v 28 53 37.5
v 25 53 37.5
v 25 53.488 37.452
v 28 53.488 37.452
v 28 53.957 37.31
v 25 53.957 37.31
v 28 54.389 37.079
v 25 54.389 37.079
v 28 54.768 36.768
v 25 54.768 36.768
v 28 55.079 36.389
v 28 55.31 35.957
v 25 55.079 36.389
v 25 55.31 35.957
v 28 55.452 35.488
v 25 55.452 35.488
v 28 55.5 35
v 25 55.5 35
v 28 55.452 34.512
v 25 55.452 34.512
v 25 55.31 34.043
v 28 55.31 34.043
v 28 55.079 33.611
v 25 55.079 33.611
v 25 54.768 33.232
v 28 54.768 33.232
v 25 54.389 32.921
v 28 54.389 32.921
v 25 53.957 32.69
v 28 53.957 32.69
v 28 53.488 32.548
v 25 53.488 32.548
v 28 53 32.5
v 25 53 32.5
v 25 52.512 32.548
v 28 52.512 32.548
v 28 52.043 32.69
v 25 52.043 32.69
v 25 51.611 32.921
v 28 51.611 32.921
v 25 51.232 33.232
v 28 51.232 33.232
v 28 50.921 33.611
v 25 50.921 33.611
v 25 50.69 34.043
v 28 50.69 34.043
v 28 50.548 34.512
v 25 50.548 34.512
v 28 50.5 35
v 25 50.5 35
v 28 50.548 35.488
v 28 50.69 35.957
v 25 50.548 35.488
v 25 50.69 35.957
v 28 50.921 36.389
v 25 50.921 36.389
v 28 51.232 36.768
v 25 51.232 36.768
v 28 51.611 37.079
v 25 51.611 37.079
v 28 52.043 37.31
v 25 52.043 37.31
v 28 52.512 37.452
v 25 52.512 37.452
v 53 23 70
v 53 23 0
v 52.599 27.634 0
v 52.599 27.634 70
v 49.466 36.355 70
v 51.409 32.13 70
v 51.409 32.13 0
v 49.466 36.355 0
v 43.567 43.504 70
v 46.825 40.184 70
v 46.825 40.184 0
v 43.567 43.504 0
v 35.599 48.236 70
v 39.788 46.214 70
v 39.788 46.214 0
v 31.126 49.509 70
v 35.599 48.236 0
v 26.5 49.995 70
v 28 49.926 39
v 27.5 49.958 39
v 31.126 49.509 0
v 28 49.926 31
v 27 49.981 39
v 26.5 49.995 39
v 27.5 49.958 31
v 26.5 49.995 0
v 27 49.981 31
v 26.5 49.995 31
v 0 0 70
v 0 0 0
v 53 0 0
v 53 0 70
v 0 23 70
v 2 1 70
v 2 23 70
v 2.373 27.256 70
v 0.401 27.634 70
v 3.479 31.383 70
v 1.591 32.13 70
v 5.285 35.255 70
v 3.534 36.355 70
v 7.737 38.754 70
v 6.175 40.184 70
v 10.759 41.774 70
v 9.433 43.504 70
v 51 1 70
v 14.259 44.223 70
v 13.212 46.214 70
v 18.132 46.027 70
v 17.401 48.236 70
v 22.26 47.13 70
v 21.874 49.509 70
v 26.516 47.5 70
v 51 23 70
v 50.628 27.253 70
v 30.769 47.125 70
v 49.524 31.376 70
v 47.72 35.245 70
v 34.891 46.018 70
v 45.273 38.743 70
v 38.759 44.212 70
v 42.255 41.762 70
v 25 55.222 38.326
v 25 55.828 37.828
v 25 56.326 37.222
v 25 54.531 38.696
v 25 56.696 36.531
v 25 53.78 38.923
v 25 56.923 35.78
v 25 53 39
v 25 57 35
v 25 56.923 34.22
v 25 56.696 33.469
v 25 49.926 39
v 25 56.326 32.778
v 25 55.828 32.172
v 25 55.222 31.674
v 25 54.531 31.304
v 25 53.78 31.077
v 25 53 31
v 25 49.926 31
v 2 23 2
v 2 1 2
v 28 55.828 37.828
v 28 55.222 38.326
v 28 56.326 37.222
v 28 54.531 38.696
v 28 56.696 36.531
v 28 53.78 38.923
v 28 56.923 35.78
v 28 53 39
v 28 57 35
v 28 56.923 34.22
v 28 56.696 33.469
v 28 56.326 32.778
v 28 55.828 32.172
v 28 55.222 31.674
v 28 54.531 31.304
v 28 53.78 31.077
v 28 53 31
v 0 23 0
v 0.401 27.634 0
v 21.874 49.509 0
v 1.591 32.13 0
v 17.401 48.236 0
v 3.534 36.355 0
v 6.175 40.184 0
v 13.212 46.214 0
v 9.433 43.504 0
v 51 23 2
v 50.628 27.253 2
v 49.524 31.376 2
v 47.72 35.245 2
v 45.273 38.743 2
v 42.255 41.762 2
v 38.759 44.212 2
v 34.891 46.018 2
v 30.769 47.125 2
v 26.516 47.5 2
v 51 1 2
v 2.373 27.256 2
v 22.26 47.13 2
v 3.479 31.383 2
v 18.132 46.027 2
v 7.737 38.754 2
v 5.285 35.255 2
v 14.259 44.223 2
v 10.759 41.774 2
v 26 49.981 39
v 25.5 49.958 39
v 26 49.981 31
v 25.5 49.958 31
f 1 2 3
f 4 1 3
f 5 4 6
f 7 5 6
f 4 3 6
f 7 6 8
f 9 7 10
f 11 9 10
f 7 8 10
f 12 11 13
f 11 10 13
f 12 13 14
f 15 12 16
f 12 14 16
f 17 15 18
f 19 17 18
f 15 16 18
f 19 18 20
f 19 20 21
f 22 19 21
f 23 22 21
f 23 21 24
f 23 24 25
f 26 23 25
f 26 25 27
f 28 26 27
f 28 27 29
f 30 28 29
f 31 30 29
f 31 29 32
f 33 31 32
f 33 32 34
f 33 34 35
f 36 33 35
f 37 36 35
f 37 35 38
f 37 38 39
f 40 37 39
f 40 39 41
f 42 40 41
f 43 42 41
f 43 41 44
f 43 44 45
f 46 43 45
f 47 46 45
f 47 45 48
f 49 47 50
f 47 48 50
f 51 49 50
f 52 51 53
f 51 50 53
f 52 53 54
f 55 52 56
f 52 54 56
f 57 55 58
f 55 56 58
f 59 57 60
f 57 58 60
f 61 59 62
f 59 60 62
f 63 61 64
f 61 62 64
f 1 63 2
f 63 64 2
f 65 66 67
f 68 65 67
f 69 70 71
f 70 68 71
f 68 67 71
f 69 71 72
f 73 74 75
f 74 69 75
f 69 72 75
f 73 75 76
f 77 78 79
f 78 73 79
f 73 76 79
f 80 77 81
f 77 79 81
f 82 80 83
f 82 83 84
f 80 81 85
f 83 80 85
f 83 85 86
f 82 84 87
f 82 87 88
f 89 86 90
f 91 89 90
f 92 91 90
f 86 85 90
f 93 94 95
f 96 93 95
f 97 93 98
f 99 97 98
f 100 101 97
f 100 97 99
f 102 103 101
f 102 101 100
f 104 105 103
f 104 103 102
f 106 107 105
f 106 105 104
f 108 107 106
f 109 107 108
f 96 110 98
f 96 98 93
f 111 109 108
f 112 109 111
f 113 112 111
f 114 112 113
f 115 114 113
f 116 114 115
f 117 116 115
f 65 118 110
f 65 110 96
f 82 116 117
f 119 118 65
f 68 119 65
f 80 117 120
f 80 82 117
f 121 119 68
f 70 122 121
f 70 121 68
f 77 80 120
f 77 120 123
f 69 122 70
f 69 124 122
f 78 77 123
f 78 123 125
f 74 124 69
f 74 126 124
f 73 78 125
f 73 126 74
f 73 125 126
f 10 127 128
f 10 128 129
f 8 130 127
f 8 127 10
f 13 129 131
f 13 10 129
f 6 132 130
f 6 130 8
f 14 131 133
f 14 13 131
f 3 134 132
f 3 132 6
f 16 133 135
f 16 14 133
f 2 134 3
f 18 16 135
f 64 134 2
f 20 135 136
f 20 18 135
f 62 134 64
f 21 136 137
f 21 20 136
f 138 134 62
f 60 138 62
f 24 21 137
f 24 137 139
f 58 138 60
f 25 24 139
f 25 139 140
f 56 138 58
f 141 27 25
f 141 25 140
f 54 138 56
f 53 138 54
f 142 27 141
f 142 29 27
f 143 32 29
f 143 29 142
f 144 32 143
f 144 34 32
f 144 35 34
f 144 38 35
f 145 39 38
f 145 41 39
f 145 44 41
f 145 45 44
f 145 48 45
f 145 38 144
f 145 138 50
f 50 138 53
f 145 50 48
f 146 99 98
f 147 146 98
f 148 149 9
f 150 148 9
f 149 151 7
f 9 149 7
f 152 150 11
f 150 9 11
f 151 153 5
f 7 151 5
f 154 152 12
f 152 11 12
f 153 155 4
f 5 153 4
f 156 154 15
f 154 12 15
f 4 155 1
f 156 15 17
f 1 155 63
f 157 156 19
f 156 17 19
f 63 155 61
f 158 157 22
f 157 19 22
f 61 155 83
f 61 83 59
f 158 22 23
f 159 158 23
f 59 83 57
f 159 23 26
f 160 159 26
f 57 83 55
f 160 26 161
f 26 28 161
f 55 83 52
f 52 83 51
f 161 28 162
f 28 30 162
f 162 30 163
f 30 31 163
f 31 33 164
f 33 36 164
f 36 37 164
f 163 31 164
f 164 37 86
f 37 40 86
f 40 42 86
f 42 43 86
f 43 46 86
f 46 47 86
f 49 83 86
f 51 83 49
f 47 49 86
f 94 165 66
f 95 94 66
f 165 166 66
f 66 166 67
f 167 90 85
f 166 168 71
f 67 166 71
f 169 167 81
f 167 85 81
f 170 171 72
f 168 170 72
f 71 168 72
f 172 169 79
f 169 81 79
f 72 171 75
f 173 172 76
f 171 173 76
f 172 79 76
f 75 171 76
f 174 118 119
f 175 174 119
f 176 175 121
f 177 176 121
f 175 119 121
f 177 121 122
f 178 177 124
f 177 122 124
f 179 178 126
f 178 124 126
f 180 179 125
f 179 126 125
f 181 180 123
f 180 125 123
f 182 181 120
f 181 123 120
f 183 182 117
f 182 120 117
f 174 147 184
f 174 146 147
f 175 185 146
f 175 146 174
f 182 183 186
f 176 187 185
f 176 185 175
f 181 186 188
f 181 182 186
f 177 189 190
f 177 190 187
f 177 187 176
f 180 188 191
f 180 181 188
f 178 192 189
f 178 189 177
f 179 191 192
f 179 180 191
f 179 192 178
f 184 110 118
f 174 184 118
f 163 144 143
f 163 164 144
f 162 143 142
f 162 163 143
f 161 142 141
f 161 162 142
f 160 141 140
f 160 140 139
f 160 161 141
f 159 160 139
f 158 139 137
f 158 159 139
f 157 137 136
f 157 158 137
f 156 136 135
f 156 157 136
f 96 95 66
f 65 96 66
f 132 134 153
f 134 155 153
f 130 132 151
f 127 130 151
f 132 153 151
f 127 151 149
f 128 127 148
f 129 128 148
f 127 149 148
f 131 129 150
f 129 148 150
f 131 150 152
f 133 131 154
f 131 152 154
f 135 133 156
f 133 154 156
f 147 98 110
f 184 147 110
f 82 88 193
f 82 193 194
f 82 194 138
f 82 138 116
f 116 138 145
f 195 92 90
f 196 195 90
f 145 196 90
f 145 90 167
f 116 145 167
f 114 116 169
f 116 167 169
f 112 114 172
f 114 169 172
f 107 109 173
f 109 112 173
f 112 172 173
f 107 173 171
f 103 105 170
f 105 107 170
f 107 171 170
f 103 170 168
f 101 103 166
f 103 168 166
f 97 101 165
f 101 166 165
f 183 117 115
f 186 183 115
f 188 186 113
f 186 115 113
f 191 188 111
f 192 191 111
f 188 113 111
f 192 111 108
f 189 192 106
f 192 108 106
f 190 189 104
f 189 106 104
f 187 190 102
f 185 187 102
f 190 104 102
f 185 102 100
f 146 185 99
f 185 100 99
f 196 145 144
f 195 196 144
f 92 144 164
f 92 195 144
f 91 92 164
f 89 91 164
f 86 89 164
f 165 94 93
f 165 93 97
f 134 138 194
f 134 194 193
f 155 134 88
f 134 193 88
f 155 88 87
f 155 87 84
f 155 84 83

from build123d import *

# Parameters (mm, degrees)
ESQUISSE1_W             = 53
ESQUISSE1_H             = 50
BOSS_EXTRU_1_DEPTH      = 70
ESQUISSE5_W             = 3
ESQUISSE5_H             = 8
BOSS_EXTRU_2_DEPTH      = 7
CONG_1_R                = 4
CONG_2_R                = 27
ESQUISSE8_R             = 2.5
ENL_V_MAT_EXTRU_3_DEPTH = 7
ENL_V_MAT_EXTRU_4_DEPTH = 68


# Some blends are built 0.0001 mm under size
with BuildPart() as part:
    # Esquisse1 → Boss.-Extru.1 (new body)
    with BuildSketch(Plane.XY):
        with Locations((26.5, 25)):
            Rectangle(ESQUISSE1_W, ESQUISSE1_H)
    extrude(amount=BOSS_EXTRU_1_DEPTH)

    # Esquisse5 → Boss.-Extru.2 (add)
    with BuildSketch(Plane(origin=(0, 50, 0), x_dir=(1, 0, 0), z_dir=(0, 1, 0))):
        with Locations((26.5, -35)):
            Rectangle(ESQUISSE5_W, ESQUISSE5_H)
    extrude(amount=BOSS_EXTRU_2_DEPTH)

    # Congé1
    cong_1_edges = [part.edges().sort_by_distance(p)[0] for p in [
        (26.5, 57, 31),
        (26.5, 57, 39),
    ]]
    fillet(cong_1_edges, radius=CONG_1_R - 0.0001)  # a hair under: the kernel refuses the full size

    # Congé2
    # the kernel refuses this fillet: 27 mm, written as the material it takes off along each edge
    with BuildSketch(Plane(origin=(0, 50, -67.5), x_dir=(1, 0, 0), z_dir=(0, 0, 1))) as cong_2_piece_1_section:
        with BuildLine():
            CenterArc((CONG_2_R, -CONG_2_R), CONG_2_R, 90, 90)
            Line((0, -CONG_2_R), (0, 0))
            Line((0, 0), (CONG_2_R, 0))
        make_face()
    cong_2_piece_1 = extrude(amount=205, mode=Mode.PRIVATE)
    cong_2_piece_1 = split(cong_2_piece_1, bisect_by=Plane(origin=(25, 50.257211281, -18.25), z_dir=(1, 0, 0)), keep=Keep.TOP, mode=Mode.PRIVATE)
    cong_2_piece_1 = split(cong_2_piece_1, bisect_by=Plane(origin=(25.978114042, 50.257211281, 31), z_dir=(0, 0, -1)), keep=Keep.TOP, mode=Mode.PRIVATE)
    add(cong_2_piece_1, mode=Mode.SUBTRACT)
    with BuildSketch(Plane(origin=(0, 50, -67.5), x_dir=(1, 0, 0), z_dir=(0, 0, 1))) as cong_2_piece_2_section:
        with BuildLine():
            CenterArc((CONG_2_R, -CONG_2_R), CONG_2_R, 90, 90)
            Line((0, -CONG_2_R), (0, 0))
            Line((0, 0), (CONG_2_R, 0))
        make_face()
    cong_2_piece_2 = extrude(amount=205, mode=Mode.PRIVATE)
    cong_2_piece_2 = split(cong_2_piece_2, bisect_by=Plane(origin=(25, 43.848394797, -18.25), z_dir=(-1, 0, 0)), keep=Keep.TOP, mode=Mode.PRIVATE)
    cong_2_piece_2 = split(cong_2_piece_2, bisect_by=Plane(origin=(5.991236712, 43.848394797, 31), z_dir=(0, 0, -1)), keep=Keep.TOP, mode=Mode.PRIVATE)
    add(cong_2_piece_2, mode=Mode.SUBTRACT)
    with BuildSketch(Plane(origin=(0, 50, -67.5), x_dir=(1, 0, 0), z_dir=(0, 0, 1))) as cong_2_piece_3_section:
        with BuildLine():
            CenterArc((CONG_2_R, -CONG_2_R), CONG_2_R, 90, 90)
            Line((0, -CONG_2_R), (0, 0))
            Line((0, 0), (CONG_2_R, 0))
        make_face()
    cong_2_piece_3 = extrude(amount=205, mode=Mode.PRIVATE)
    cong_2_piece_3 = split(cong_2_piece_3, bisect_by=Plane(origin=(25, 43.848394797, 35), z_dir=(-1, 0, 0)), keep=Keep.TOP, mode=Mode.PRIVATE)
    cong_2_piece_3 = split(cong_2_piece_3, bisect_by=Plane(origin=(5.991236712, 43.848394797, 31), z_dir=(0, 0, 1)), keep=Keep.TOP, mode=Mode.PRIVATE)
    cong_2_piece_3 = split(cong_2_piece_3, bisect_by=Plane(origin=(5.991236712, 43.848394797, 39), z_dir=(0, 0, -1)), keep=Keep.TOP, mode=Mode.PRIVATE)
    add(cong_2_piece_3, mode=Mode.SUBTRACT)
    with BuildSketch(Plane(origin=(0, 50, -67.5), x_dir=(1, 0, 0), z_dir=(0, 0, 1))) as cong_2_piece_4_section:
        with BuildLine():
            CenterArc((CONG_2_R, -CONG_2_R), CONG_2_R, 90, 90)
            Line((0, -CONG_2_R), (0, 0))
            Line((0, 0), (CONG_2_R, 0))
        make_face()
    cong_2_piece_4 = extrude(amount=205, mode=Mode.PRIVATE)
    cong_2_piece_4 = split(cong_2_piece_4, bisect_by=Plane(origin=(25, 50.257211281, 88.25), z_dir=(1, 0, 0)), keep=Keep.TOP, mode=Mode.PRIVATE)
    cong_2_piece_4 = split(cong_2_piece_4, bisect_by=Plane(origin=(25.978114042, 50.257211281, 39), z_dir=(0, 0, 1)), keep=Keep.TOP, mode=Mode.PRIVATE)
    add(cong_2_piece_4, mode=Mode.SUBTRACT)
    with BuildSketch(Plane(origin=(0, 50, -67.5), x_dir=(1, 0, 0), z_dir=(0, 0, 1))) as cong_2_piece_5_section:
        with BuildLine():
            CenterArc((CONG_2_R, -CONG_2_R), CONG_2_R, 90, 90)
            Line((0, -CONG_2_R), (0, 0))
            Line((0, 0), (CONG_2_R, 0))
        make_face()
    cong_2_piece_5 = extrude(amount=205, mode=Mode.PRIVATE)
    cong_2_piece_5 = split(cong_2_piece_5, bisect_by=Plane(origin=(25, 43.848394797, 88.25), z_dir=(-1, 0, 0)), keep=Keep.TOP, mode=Mode.PRIVATE)
    cong_2_piece_5 = split(cong_2_piece_5, bisect_by=Plane(origin=(5.991236712, 43.848394797, 39), z_dir=(0, 0, 1)), keep=Keep.TOP, mode=Mode.PRIVATE)
    add(cong_2_piece_5, mode=Mode.SUBTRACT)
    with BuildSketch(Plane(origin=(53, 50, -67.5), x_dir=(-1, 0, 0), z_dir=(0, 0, 1))) as cong_2_piece_6_section:
        with BuildLine():
            CenterArc((CONG_2_R, CONG_2_R), CONG_2_R, 180, 90)
            Line((0, CONG_2_R), (0, 0))
            Line((0, 0), (CONG_2_R, 0))
        make_face()
    cong_2_piece_6 = extrude(amount=205, mode=Mode.PRIVATE)
    cong_2_piece_6 = split(cong_2_piece_6, bisect_by=Plane(origin=(27.021885958, 50.257211281, 31), z_dir=(0, 0, -1)), keep=Keep.TOP, mode=Mode.PRIVATE)
    cong_2_piece_6 = split(cong_2_piece_6, bisect_by=Plane(origin=(28, 50.257211281, -18.25), z_dir=(-1, 0, 0)), keep=Keep.TOP, mode=Mode.PRIVATE)
    add(cong_2_piece_6, mode=Mode.SUBTRACT)
    with BuildSketch(Plane(origin=(53, 50, -67.5), x_dir=(-1, 0, 0), z_dir=(0, 0, 1))) as cong_2_piece_7_section:
        with BuildLine():
            CenterArc((CONG_2_R, CONG_2_R), CONG_2_R, 180, 90)
            Line((0, CONG_2_R), (0, 0))
            Line((0, 0), (CONG_2_R, 0))
        make_face()
    cong_2_piece_7 = extrude(amount=205, mode=Mode.PRIVATE)
    cong_2_piece_7 = split(cong_2_piece_7, bisect_by=Plane(origin=(47.008763288, 43.848394797, 31), z_dir=(0, 0, -1)), keep=Keep.TOP, mode=Mode.PRIVATE)
    cong_2_piece_7 = split(cong_2_piece_7, bisect_by=Plane(origin=(28, 43.848394797, -18.25), z_dir=(1, 0, 0)), keep=Keep.TOP, mode=Mode.PRIVATE)
    add(cong_2_piece_7, mode=Mode.SUBTRACT)
    with BuildSketch(Plane(origin=(53, 50, -67.5), x_dir=(-1, 0, 0), z_dir=(0, 0, 1))) as cong_2_piece_8_section:
        with BuildLine():
            CenterArc((CONG_2_R, CONG_2_R), CONG_2_R, 180, 90)
            Line((0, CONG_2_R), (0, 0))
            Line((0, 0), (CONG_2_R, 0))
        make_face()
    cong_2_piece_8 = extrude(amount=205, mode=Mode.PRIVATE)
    cong_2_piece_8 = split(cong_2_piece_8, bisect_by=Plane(origin=(47.008763288, 43.848394797, 31), z_dir=(0, 0, 1)), keep=Keep.TOP, mode=Mode.PRIVATE)
    cong_2_piece_8 = split(cong_2_piece_8, bisect_by=Plane(origin=(28, 43.848394797, 35), z_dir=(1, 0, 0)), keep=Keep.TOP, mode=Mode.PRIVATE)
    cong_2_piece_8 = split(cong_2_piece_8, bisect_by=Plane(origin=(47.008763288, 43.848394797, 39), z_dir=(0, 0, -1)), keep=Keep.TOP, mode=Mode.PRIVATE)
    add(cong_2_piece_8, mode=Mode.SUBTRACT)
    with BuildSketch(Plane(origin=(53, 50, -67.5), x_dir=(-1, 0, 0), z_dir=(0, 0, 1))) as cong_2_piece_9_section:
        with BuildLine():
            CenterArc((CONG_2_R, CONG_2_R), CONG_2_R, 180, 90)
            Line((0, CONG_2_R), (0, 0))
            Line((0, 0), (CONG_2_R, 0))
        make_face()
    cong_2_piece_9 = extrude(amount=205, mode=Mode.PRIVATE)
    cong_2_piece_9 = split(cong_2_piece_9, bisect_by=Plane(origin=(28, 50.257211281, 88.25), z_dir=(-1, 0, 0)), keep=Keep.TOP, mode=Mode.PRIVATE)
    cong_2_piece_9 = split(cong_2_piece_9, bisect_by=Plane(origin=(27.021885958, 50.257211281, 39), z_dir=(0, 0, 1)), keep=Keep.TOP, mode=Mode.PRIVATE)
    add(cong_2_piece_9, mode=Mode.SUBTRACT)
    with BuildSketch(Plane(origin=(53, 50, -67.5), x_dir=(-1, 0, 0), z_dir=(0, 0, 1))) as cong_2_piece_10_section:
        with BuildLine():
            CenterArc((CONG_2_R, CONG_2_R), CONG_2_R, 180, 90)
            Line((0, CONG_2_R), (0, 0))
            Line((0, 0), (CONG_2_R, 0))
        make_face()
    cong_2_piece_10 = extrude(amount=205, mode=Mode.PRIVATE)
    cong_2_piece_10 = split(cong_2_piece_10, bisect_by=Plane(origin=(28, 43.848394797, 88.25), z_dir=(1, 0, 0)), keep=Keep.TOP, mode=Mode.PRIVATE)
    cong_2_piece_10 = split(cong_2_piece_10, bisect_by=Plane(origin=(47.008763288, 43.848394797, 39), z_dir=(0, 0, 1)), keep=Keep.TOP, mode=Mode.PRIVATE)
    add(cong_2_piece_10, mode=Mode.SUBTRACT)

    # Esquisse8 → Enlèv. mat.-Extru.3 (cut)
    with BuildSketch(Plane.ZY.offset(-25)):
        with Locations((35, 53)):
            Circle(ESQUISSE8_R)
    extrude(amount=-ENL_V_MAT_EXTRU_3_DEPTH, mode=Mode.SUBTRACT)

    # Esquisse9 → Enlèv. mat.-Extru.4 (cut)
    with BuildSketch(Plane.XY.offset(70)):
        with BuildLine():
            Line((2, 1), (51, 1))
            Line((51, 1), (51, 23))
            ThreePointArc((51, 23), (43.829843545, 40.318386839), (26.516202227, 47.499994643))
            ThreePointArc((26.516202227, 47.499994643), (9.181613161, 40.329843545), (2, 23))
            Line((2, 23), (2, 1))
        make_face()
    extrude(amount=-ENL_V_MAT_EXTRU_4_DEPTH, mode=Mode.SUBTRACT)


solid = part.part
